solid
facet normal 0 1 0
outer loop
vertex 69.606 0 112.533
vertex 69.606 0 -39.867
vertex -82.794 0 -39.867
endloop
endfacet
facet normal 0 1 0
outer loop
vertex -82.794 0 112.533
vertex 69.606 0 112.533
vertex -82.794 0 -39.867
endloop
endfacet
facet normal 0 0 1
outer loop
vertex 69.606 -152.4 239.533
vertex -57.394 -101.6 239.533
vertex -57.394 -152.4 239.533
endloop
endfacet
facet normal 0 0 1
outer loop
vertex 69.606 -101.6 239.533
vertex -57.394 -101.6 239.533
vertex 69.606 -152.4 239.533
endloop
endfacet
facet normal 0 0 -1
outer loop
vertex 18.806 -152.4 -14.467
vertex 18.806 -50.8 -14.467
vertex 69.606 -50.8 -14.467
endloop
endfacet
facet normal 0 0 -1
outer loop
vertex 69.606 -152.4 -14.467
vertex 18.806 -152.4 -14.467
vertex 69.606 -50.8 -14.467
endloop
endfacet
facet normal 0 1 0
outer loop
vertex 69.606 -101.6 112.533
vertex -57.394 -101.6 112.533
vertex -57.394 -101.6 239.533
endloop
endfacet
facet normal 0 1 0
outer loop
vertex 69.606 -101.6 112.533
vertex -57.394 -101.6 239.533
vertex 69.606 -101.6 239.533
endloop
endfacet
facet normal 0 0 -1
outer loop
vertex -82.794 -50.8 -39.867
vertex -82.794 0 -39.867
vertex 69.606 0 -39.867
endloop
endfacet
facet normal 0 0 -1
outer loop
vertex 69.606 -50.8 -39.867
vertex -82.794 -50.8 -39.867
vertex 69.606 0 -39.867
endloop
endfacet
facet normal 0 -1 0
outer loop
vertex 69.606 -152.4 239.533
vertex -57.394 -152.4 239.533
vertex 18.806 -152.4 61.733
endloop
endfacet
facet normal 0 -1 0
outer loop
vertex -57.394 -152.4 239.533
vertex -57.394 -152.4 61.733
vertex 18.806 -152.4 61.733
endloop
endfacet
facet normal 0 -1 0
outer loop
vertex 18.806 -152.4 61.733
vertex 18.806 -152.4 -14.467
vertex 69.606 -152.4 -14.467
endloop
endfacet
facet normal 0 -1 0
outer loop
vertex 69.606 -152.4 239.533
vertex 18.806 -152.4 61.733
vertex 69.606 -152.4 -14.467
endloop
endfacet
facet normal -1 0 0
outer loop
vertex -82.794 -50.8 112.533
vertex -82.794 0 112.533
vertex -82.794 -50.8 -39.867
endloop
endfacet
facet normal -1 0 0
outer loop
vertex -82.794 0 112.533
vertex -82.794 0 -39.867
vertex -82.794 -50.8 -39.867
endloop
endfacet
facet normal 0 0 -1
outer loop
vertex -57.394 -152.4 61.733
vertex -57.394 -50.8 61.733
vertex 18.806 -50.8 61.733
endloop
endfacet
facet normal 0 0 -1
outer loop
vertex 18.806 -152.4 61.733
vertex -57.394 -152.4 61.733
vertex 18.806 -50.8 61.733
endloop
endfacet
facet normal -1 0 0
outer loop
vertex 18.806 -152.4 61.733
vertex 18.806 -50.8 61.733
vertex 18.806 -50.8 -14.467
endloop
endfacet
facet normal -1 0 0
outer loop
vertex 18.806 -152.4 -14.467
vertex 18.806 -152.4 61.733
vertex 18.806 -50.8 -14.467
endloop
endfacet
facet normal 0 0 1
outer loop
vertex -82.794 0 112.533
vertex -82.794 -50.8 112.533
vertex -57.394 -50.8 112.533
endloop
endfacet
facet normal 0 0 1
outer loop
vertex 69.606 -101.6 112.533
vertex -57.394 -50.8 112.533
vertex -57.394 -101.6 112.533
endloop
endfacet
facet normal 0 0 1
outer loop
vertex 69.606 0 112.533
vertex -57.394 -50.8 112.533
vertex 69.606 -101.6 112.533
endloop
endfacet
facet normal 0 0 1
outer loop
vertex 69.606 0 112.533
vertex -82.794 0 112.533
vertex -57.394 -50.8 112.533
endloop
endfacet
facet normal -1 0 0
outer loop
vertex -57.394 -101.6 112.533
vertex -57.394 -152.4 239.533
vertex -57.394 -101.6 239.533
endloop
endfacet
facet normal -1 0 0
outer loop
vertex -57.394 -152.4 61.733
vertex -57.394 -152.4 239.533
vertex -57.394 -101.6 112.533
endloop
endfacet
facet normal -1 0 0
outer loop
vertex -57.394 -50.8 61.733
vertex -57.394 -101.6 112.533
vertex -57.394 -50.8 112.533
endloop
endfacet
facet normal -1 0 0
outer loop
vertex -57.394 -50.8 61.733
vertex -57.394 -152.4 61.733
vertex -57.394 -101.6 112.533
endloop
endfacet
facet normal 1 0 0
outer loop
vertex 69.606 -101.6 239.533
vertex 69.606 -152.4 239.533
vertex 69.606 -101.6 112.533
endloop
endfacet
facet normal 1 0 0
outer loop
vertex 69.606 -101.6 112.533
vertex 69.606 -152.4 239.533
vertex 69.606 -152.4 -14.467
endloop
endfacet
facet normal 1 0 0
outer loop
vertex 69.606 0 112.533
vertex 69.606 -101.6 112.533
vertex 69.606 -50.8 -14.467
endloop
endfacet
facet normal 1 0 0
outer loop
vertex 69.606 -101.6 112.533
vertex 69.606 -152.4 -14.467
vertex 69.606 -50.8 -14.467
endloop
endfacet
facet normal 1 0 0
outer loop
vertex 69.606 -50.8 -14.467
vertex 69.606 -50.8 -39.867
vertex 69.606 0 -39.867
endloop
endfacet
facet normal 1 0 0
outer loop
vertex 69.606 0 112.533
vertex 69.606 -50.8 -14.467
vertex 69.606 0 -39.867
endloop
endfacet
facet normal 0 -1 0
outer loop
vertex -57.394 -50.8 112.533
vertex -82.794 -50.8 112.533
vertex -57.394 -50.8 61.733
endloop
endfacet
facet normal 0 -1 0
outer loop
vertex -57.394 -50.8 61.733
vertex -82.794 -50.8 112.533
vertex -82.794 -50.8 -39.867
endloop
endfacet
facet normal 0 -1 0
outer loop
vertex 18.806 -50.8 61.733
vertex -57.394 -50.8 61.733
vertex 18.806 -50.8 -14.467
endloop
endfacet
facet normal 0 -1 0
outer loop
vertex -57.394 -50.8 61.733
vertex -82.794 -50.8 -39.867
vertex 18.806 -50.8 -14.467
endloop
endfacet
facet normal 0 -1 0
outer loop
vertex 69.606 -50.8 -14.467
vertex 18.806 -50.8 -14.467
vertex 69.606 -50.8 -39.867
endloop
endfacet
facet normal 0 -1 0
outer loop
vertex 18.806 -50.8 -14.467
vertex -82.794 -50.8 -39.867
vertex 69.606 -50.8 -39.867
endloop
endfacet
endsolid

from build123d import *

# Parameters (mm, degrees)
F0_W     = 152.4
F0_H     = 127
F1_DEPTH = 50.8
F3_DEPTH = 101.6
F5_DEPTH = 25.4
F6_W     = 127
F6_H     = 50.8
F7_DEPTH = 127


with BuildPart() as f1:
    # F0 (on Front) → F1 (new body)
    with BuildSketch(Plane.XZ):
        with Locations((-6.594061, 23.633106)):
            Rectangle(F0_W, F0_H)
    extrude(amount=F1_DEPTH)

    # F2 (on face) → F3 (join)
    with BuildSketch(Plane.XZ.offset(50.8)):
        Polygon((18.805939, -14.466894), (69.605939, -14.466894), (69.605939, 87.133106), (-57.394061, 87.133106), (-57.394061, 61.733106), (18.805939, 61.733106), align=None)
    extrude(amount=F3_DEPTH)

    # F4 (on face) → F5 (join)
    with BuildSketch(Plane.XY.offset(87.133106)):
        Polygon((69.605939, 0), (-82.794061, 0), (-82.794061, -50.8), (-57.394061, -50.8), (-57.394061, -152.4), (69.605939, -152.4), align=None)
    extrude(amount=F5_DEPTH)

    # F6 (on face) → F7 (join)
    with BuildSketch(Plane.XY.offset(112.533106)):
        with Locations((6.105939, -127)):
            Rectangle(F6_W, F6_H)
    extrude(amount=F7_DEPTH)


solid = f1.part
